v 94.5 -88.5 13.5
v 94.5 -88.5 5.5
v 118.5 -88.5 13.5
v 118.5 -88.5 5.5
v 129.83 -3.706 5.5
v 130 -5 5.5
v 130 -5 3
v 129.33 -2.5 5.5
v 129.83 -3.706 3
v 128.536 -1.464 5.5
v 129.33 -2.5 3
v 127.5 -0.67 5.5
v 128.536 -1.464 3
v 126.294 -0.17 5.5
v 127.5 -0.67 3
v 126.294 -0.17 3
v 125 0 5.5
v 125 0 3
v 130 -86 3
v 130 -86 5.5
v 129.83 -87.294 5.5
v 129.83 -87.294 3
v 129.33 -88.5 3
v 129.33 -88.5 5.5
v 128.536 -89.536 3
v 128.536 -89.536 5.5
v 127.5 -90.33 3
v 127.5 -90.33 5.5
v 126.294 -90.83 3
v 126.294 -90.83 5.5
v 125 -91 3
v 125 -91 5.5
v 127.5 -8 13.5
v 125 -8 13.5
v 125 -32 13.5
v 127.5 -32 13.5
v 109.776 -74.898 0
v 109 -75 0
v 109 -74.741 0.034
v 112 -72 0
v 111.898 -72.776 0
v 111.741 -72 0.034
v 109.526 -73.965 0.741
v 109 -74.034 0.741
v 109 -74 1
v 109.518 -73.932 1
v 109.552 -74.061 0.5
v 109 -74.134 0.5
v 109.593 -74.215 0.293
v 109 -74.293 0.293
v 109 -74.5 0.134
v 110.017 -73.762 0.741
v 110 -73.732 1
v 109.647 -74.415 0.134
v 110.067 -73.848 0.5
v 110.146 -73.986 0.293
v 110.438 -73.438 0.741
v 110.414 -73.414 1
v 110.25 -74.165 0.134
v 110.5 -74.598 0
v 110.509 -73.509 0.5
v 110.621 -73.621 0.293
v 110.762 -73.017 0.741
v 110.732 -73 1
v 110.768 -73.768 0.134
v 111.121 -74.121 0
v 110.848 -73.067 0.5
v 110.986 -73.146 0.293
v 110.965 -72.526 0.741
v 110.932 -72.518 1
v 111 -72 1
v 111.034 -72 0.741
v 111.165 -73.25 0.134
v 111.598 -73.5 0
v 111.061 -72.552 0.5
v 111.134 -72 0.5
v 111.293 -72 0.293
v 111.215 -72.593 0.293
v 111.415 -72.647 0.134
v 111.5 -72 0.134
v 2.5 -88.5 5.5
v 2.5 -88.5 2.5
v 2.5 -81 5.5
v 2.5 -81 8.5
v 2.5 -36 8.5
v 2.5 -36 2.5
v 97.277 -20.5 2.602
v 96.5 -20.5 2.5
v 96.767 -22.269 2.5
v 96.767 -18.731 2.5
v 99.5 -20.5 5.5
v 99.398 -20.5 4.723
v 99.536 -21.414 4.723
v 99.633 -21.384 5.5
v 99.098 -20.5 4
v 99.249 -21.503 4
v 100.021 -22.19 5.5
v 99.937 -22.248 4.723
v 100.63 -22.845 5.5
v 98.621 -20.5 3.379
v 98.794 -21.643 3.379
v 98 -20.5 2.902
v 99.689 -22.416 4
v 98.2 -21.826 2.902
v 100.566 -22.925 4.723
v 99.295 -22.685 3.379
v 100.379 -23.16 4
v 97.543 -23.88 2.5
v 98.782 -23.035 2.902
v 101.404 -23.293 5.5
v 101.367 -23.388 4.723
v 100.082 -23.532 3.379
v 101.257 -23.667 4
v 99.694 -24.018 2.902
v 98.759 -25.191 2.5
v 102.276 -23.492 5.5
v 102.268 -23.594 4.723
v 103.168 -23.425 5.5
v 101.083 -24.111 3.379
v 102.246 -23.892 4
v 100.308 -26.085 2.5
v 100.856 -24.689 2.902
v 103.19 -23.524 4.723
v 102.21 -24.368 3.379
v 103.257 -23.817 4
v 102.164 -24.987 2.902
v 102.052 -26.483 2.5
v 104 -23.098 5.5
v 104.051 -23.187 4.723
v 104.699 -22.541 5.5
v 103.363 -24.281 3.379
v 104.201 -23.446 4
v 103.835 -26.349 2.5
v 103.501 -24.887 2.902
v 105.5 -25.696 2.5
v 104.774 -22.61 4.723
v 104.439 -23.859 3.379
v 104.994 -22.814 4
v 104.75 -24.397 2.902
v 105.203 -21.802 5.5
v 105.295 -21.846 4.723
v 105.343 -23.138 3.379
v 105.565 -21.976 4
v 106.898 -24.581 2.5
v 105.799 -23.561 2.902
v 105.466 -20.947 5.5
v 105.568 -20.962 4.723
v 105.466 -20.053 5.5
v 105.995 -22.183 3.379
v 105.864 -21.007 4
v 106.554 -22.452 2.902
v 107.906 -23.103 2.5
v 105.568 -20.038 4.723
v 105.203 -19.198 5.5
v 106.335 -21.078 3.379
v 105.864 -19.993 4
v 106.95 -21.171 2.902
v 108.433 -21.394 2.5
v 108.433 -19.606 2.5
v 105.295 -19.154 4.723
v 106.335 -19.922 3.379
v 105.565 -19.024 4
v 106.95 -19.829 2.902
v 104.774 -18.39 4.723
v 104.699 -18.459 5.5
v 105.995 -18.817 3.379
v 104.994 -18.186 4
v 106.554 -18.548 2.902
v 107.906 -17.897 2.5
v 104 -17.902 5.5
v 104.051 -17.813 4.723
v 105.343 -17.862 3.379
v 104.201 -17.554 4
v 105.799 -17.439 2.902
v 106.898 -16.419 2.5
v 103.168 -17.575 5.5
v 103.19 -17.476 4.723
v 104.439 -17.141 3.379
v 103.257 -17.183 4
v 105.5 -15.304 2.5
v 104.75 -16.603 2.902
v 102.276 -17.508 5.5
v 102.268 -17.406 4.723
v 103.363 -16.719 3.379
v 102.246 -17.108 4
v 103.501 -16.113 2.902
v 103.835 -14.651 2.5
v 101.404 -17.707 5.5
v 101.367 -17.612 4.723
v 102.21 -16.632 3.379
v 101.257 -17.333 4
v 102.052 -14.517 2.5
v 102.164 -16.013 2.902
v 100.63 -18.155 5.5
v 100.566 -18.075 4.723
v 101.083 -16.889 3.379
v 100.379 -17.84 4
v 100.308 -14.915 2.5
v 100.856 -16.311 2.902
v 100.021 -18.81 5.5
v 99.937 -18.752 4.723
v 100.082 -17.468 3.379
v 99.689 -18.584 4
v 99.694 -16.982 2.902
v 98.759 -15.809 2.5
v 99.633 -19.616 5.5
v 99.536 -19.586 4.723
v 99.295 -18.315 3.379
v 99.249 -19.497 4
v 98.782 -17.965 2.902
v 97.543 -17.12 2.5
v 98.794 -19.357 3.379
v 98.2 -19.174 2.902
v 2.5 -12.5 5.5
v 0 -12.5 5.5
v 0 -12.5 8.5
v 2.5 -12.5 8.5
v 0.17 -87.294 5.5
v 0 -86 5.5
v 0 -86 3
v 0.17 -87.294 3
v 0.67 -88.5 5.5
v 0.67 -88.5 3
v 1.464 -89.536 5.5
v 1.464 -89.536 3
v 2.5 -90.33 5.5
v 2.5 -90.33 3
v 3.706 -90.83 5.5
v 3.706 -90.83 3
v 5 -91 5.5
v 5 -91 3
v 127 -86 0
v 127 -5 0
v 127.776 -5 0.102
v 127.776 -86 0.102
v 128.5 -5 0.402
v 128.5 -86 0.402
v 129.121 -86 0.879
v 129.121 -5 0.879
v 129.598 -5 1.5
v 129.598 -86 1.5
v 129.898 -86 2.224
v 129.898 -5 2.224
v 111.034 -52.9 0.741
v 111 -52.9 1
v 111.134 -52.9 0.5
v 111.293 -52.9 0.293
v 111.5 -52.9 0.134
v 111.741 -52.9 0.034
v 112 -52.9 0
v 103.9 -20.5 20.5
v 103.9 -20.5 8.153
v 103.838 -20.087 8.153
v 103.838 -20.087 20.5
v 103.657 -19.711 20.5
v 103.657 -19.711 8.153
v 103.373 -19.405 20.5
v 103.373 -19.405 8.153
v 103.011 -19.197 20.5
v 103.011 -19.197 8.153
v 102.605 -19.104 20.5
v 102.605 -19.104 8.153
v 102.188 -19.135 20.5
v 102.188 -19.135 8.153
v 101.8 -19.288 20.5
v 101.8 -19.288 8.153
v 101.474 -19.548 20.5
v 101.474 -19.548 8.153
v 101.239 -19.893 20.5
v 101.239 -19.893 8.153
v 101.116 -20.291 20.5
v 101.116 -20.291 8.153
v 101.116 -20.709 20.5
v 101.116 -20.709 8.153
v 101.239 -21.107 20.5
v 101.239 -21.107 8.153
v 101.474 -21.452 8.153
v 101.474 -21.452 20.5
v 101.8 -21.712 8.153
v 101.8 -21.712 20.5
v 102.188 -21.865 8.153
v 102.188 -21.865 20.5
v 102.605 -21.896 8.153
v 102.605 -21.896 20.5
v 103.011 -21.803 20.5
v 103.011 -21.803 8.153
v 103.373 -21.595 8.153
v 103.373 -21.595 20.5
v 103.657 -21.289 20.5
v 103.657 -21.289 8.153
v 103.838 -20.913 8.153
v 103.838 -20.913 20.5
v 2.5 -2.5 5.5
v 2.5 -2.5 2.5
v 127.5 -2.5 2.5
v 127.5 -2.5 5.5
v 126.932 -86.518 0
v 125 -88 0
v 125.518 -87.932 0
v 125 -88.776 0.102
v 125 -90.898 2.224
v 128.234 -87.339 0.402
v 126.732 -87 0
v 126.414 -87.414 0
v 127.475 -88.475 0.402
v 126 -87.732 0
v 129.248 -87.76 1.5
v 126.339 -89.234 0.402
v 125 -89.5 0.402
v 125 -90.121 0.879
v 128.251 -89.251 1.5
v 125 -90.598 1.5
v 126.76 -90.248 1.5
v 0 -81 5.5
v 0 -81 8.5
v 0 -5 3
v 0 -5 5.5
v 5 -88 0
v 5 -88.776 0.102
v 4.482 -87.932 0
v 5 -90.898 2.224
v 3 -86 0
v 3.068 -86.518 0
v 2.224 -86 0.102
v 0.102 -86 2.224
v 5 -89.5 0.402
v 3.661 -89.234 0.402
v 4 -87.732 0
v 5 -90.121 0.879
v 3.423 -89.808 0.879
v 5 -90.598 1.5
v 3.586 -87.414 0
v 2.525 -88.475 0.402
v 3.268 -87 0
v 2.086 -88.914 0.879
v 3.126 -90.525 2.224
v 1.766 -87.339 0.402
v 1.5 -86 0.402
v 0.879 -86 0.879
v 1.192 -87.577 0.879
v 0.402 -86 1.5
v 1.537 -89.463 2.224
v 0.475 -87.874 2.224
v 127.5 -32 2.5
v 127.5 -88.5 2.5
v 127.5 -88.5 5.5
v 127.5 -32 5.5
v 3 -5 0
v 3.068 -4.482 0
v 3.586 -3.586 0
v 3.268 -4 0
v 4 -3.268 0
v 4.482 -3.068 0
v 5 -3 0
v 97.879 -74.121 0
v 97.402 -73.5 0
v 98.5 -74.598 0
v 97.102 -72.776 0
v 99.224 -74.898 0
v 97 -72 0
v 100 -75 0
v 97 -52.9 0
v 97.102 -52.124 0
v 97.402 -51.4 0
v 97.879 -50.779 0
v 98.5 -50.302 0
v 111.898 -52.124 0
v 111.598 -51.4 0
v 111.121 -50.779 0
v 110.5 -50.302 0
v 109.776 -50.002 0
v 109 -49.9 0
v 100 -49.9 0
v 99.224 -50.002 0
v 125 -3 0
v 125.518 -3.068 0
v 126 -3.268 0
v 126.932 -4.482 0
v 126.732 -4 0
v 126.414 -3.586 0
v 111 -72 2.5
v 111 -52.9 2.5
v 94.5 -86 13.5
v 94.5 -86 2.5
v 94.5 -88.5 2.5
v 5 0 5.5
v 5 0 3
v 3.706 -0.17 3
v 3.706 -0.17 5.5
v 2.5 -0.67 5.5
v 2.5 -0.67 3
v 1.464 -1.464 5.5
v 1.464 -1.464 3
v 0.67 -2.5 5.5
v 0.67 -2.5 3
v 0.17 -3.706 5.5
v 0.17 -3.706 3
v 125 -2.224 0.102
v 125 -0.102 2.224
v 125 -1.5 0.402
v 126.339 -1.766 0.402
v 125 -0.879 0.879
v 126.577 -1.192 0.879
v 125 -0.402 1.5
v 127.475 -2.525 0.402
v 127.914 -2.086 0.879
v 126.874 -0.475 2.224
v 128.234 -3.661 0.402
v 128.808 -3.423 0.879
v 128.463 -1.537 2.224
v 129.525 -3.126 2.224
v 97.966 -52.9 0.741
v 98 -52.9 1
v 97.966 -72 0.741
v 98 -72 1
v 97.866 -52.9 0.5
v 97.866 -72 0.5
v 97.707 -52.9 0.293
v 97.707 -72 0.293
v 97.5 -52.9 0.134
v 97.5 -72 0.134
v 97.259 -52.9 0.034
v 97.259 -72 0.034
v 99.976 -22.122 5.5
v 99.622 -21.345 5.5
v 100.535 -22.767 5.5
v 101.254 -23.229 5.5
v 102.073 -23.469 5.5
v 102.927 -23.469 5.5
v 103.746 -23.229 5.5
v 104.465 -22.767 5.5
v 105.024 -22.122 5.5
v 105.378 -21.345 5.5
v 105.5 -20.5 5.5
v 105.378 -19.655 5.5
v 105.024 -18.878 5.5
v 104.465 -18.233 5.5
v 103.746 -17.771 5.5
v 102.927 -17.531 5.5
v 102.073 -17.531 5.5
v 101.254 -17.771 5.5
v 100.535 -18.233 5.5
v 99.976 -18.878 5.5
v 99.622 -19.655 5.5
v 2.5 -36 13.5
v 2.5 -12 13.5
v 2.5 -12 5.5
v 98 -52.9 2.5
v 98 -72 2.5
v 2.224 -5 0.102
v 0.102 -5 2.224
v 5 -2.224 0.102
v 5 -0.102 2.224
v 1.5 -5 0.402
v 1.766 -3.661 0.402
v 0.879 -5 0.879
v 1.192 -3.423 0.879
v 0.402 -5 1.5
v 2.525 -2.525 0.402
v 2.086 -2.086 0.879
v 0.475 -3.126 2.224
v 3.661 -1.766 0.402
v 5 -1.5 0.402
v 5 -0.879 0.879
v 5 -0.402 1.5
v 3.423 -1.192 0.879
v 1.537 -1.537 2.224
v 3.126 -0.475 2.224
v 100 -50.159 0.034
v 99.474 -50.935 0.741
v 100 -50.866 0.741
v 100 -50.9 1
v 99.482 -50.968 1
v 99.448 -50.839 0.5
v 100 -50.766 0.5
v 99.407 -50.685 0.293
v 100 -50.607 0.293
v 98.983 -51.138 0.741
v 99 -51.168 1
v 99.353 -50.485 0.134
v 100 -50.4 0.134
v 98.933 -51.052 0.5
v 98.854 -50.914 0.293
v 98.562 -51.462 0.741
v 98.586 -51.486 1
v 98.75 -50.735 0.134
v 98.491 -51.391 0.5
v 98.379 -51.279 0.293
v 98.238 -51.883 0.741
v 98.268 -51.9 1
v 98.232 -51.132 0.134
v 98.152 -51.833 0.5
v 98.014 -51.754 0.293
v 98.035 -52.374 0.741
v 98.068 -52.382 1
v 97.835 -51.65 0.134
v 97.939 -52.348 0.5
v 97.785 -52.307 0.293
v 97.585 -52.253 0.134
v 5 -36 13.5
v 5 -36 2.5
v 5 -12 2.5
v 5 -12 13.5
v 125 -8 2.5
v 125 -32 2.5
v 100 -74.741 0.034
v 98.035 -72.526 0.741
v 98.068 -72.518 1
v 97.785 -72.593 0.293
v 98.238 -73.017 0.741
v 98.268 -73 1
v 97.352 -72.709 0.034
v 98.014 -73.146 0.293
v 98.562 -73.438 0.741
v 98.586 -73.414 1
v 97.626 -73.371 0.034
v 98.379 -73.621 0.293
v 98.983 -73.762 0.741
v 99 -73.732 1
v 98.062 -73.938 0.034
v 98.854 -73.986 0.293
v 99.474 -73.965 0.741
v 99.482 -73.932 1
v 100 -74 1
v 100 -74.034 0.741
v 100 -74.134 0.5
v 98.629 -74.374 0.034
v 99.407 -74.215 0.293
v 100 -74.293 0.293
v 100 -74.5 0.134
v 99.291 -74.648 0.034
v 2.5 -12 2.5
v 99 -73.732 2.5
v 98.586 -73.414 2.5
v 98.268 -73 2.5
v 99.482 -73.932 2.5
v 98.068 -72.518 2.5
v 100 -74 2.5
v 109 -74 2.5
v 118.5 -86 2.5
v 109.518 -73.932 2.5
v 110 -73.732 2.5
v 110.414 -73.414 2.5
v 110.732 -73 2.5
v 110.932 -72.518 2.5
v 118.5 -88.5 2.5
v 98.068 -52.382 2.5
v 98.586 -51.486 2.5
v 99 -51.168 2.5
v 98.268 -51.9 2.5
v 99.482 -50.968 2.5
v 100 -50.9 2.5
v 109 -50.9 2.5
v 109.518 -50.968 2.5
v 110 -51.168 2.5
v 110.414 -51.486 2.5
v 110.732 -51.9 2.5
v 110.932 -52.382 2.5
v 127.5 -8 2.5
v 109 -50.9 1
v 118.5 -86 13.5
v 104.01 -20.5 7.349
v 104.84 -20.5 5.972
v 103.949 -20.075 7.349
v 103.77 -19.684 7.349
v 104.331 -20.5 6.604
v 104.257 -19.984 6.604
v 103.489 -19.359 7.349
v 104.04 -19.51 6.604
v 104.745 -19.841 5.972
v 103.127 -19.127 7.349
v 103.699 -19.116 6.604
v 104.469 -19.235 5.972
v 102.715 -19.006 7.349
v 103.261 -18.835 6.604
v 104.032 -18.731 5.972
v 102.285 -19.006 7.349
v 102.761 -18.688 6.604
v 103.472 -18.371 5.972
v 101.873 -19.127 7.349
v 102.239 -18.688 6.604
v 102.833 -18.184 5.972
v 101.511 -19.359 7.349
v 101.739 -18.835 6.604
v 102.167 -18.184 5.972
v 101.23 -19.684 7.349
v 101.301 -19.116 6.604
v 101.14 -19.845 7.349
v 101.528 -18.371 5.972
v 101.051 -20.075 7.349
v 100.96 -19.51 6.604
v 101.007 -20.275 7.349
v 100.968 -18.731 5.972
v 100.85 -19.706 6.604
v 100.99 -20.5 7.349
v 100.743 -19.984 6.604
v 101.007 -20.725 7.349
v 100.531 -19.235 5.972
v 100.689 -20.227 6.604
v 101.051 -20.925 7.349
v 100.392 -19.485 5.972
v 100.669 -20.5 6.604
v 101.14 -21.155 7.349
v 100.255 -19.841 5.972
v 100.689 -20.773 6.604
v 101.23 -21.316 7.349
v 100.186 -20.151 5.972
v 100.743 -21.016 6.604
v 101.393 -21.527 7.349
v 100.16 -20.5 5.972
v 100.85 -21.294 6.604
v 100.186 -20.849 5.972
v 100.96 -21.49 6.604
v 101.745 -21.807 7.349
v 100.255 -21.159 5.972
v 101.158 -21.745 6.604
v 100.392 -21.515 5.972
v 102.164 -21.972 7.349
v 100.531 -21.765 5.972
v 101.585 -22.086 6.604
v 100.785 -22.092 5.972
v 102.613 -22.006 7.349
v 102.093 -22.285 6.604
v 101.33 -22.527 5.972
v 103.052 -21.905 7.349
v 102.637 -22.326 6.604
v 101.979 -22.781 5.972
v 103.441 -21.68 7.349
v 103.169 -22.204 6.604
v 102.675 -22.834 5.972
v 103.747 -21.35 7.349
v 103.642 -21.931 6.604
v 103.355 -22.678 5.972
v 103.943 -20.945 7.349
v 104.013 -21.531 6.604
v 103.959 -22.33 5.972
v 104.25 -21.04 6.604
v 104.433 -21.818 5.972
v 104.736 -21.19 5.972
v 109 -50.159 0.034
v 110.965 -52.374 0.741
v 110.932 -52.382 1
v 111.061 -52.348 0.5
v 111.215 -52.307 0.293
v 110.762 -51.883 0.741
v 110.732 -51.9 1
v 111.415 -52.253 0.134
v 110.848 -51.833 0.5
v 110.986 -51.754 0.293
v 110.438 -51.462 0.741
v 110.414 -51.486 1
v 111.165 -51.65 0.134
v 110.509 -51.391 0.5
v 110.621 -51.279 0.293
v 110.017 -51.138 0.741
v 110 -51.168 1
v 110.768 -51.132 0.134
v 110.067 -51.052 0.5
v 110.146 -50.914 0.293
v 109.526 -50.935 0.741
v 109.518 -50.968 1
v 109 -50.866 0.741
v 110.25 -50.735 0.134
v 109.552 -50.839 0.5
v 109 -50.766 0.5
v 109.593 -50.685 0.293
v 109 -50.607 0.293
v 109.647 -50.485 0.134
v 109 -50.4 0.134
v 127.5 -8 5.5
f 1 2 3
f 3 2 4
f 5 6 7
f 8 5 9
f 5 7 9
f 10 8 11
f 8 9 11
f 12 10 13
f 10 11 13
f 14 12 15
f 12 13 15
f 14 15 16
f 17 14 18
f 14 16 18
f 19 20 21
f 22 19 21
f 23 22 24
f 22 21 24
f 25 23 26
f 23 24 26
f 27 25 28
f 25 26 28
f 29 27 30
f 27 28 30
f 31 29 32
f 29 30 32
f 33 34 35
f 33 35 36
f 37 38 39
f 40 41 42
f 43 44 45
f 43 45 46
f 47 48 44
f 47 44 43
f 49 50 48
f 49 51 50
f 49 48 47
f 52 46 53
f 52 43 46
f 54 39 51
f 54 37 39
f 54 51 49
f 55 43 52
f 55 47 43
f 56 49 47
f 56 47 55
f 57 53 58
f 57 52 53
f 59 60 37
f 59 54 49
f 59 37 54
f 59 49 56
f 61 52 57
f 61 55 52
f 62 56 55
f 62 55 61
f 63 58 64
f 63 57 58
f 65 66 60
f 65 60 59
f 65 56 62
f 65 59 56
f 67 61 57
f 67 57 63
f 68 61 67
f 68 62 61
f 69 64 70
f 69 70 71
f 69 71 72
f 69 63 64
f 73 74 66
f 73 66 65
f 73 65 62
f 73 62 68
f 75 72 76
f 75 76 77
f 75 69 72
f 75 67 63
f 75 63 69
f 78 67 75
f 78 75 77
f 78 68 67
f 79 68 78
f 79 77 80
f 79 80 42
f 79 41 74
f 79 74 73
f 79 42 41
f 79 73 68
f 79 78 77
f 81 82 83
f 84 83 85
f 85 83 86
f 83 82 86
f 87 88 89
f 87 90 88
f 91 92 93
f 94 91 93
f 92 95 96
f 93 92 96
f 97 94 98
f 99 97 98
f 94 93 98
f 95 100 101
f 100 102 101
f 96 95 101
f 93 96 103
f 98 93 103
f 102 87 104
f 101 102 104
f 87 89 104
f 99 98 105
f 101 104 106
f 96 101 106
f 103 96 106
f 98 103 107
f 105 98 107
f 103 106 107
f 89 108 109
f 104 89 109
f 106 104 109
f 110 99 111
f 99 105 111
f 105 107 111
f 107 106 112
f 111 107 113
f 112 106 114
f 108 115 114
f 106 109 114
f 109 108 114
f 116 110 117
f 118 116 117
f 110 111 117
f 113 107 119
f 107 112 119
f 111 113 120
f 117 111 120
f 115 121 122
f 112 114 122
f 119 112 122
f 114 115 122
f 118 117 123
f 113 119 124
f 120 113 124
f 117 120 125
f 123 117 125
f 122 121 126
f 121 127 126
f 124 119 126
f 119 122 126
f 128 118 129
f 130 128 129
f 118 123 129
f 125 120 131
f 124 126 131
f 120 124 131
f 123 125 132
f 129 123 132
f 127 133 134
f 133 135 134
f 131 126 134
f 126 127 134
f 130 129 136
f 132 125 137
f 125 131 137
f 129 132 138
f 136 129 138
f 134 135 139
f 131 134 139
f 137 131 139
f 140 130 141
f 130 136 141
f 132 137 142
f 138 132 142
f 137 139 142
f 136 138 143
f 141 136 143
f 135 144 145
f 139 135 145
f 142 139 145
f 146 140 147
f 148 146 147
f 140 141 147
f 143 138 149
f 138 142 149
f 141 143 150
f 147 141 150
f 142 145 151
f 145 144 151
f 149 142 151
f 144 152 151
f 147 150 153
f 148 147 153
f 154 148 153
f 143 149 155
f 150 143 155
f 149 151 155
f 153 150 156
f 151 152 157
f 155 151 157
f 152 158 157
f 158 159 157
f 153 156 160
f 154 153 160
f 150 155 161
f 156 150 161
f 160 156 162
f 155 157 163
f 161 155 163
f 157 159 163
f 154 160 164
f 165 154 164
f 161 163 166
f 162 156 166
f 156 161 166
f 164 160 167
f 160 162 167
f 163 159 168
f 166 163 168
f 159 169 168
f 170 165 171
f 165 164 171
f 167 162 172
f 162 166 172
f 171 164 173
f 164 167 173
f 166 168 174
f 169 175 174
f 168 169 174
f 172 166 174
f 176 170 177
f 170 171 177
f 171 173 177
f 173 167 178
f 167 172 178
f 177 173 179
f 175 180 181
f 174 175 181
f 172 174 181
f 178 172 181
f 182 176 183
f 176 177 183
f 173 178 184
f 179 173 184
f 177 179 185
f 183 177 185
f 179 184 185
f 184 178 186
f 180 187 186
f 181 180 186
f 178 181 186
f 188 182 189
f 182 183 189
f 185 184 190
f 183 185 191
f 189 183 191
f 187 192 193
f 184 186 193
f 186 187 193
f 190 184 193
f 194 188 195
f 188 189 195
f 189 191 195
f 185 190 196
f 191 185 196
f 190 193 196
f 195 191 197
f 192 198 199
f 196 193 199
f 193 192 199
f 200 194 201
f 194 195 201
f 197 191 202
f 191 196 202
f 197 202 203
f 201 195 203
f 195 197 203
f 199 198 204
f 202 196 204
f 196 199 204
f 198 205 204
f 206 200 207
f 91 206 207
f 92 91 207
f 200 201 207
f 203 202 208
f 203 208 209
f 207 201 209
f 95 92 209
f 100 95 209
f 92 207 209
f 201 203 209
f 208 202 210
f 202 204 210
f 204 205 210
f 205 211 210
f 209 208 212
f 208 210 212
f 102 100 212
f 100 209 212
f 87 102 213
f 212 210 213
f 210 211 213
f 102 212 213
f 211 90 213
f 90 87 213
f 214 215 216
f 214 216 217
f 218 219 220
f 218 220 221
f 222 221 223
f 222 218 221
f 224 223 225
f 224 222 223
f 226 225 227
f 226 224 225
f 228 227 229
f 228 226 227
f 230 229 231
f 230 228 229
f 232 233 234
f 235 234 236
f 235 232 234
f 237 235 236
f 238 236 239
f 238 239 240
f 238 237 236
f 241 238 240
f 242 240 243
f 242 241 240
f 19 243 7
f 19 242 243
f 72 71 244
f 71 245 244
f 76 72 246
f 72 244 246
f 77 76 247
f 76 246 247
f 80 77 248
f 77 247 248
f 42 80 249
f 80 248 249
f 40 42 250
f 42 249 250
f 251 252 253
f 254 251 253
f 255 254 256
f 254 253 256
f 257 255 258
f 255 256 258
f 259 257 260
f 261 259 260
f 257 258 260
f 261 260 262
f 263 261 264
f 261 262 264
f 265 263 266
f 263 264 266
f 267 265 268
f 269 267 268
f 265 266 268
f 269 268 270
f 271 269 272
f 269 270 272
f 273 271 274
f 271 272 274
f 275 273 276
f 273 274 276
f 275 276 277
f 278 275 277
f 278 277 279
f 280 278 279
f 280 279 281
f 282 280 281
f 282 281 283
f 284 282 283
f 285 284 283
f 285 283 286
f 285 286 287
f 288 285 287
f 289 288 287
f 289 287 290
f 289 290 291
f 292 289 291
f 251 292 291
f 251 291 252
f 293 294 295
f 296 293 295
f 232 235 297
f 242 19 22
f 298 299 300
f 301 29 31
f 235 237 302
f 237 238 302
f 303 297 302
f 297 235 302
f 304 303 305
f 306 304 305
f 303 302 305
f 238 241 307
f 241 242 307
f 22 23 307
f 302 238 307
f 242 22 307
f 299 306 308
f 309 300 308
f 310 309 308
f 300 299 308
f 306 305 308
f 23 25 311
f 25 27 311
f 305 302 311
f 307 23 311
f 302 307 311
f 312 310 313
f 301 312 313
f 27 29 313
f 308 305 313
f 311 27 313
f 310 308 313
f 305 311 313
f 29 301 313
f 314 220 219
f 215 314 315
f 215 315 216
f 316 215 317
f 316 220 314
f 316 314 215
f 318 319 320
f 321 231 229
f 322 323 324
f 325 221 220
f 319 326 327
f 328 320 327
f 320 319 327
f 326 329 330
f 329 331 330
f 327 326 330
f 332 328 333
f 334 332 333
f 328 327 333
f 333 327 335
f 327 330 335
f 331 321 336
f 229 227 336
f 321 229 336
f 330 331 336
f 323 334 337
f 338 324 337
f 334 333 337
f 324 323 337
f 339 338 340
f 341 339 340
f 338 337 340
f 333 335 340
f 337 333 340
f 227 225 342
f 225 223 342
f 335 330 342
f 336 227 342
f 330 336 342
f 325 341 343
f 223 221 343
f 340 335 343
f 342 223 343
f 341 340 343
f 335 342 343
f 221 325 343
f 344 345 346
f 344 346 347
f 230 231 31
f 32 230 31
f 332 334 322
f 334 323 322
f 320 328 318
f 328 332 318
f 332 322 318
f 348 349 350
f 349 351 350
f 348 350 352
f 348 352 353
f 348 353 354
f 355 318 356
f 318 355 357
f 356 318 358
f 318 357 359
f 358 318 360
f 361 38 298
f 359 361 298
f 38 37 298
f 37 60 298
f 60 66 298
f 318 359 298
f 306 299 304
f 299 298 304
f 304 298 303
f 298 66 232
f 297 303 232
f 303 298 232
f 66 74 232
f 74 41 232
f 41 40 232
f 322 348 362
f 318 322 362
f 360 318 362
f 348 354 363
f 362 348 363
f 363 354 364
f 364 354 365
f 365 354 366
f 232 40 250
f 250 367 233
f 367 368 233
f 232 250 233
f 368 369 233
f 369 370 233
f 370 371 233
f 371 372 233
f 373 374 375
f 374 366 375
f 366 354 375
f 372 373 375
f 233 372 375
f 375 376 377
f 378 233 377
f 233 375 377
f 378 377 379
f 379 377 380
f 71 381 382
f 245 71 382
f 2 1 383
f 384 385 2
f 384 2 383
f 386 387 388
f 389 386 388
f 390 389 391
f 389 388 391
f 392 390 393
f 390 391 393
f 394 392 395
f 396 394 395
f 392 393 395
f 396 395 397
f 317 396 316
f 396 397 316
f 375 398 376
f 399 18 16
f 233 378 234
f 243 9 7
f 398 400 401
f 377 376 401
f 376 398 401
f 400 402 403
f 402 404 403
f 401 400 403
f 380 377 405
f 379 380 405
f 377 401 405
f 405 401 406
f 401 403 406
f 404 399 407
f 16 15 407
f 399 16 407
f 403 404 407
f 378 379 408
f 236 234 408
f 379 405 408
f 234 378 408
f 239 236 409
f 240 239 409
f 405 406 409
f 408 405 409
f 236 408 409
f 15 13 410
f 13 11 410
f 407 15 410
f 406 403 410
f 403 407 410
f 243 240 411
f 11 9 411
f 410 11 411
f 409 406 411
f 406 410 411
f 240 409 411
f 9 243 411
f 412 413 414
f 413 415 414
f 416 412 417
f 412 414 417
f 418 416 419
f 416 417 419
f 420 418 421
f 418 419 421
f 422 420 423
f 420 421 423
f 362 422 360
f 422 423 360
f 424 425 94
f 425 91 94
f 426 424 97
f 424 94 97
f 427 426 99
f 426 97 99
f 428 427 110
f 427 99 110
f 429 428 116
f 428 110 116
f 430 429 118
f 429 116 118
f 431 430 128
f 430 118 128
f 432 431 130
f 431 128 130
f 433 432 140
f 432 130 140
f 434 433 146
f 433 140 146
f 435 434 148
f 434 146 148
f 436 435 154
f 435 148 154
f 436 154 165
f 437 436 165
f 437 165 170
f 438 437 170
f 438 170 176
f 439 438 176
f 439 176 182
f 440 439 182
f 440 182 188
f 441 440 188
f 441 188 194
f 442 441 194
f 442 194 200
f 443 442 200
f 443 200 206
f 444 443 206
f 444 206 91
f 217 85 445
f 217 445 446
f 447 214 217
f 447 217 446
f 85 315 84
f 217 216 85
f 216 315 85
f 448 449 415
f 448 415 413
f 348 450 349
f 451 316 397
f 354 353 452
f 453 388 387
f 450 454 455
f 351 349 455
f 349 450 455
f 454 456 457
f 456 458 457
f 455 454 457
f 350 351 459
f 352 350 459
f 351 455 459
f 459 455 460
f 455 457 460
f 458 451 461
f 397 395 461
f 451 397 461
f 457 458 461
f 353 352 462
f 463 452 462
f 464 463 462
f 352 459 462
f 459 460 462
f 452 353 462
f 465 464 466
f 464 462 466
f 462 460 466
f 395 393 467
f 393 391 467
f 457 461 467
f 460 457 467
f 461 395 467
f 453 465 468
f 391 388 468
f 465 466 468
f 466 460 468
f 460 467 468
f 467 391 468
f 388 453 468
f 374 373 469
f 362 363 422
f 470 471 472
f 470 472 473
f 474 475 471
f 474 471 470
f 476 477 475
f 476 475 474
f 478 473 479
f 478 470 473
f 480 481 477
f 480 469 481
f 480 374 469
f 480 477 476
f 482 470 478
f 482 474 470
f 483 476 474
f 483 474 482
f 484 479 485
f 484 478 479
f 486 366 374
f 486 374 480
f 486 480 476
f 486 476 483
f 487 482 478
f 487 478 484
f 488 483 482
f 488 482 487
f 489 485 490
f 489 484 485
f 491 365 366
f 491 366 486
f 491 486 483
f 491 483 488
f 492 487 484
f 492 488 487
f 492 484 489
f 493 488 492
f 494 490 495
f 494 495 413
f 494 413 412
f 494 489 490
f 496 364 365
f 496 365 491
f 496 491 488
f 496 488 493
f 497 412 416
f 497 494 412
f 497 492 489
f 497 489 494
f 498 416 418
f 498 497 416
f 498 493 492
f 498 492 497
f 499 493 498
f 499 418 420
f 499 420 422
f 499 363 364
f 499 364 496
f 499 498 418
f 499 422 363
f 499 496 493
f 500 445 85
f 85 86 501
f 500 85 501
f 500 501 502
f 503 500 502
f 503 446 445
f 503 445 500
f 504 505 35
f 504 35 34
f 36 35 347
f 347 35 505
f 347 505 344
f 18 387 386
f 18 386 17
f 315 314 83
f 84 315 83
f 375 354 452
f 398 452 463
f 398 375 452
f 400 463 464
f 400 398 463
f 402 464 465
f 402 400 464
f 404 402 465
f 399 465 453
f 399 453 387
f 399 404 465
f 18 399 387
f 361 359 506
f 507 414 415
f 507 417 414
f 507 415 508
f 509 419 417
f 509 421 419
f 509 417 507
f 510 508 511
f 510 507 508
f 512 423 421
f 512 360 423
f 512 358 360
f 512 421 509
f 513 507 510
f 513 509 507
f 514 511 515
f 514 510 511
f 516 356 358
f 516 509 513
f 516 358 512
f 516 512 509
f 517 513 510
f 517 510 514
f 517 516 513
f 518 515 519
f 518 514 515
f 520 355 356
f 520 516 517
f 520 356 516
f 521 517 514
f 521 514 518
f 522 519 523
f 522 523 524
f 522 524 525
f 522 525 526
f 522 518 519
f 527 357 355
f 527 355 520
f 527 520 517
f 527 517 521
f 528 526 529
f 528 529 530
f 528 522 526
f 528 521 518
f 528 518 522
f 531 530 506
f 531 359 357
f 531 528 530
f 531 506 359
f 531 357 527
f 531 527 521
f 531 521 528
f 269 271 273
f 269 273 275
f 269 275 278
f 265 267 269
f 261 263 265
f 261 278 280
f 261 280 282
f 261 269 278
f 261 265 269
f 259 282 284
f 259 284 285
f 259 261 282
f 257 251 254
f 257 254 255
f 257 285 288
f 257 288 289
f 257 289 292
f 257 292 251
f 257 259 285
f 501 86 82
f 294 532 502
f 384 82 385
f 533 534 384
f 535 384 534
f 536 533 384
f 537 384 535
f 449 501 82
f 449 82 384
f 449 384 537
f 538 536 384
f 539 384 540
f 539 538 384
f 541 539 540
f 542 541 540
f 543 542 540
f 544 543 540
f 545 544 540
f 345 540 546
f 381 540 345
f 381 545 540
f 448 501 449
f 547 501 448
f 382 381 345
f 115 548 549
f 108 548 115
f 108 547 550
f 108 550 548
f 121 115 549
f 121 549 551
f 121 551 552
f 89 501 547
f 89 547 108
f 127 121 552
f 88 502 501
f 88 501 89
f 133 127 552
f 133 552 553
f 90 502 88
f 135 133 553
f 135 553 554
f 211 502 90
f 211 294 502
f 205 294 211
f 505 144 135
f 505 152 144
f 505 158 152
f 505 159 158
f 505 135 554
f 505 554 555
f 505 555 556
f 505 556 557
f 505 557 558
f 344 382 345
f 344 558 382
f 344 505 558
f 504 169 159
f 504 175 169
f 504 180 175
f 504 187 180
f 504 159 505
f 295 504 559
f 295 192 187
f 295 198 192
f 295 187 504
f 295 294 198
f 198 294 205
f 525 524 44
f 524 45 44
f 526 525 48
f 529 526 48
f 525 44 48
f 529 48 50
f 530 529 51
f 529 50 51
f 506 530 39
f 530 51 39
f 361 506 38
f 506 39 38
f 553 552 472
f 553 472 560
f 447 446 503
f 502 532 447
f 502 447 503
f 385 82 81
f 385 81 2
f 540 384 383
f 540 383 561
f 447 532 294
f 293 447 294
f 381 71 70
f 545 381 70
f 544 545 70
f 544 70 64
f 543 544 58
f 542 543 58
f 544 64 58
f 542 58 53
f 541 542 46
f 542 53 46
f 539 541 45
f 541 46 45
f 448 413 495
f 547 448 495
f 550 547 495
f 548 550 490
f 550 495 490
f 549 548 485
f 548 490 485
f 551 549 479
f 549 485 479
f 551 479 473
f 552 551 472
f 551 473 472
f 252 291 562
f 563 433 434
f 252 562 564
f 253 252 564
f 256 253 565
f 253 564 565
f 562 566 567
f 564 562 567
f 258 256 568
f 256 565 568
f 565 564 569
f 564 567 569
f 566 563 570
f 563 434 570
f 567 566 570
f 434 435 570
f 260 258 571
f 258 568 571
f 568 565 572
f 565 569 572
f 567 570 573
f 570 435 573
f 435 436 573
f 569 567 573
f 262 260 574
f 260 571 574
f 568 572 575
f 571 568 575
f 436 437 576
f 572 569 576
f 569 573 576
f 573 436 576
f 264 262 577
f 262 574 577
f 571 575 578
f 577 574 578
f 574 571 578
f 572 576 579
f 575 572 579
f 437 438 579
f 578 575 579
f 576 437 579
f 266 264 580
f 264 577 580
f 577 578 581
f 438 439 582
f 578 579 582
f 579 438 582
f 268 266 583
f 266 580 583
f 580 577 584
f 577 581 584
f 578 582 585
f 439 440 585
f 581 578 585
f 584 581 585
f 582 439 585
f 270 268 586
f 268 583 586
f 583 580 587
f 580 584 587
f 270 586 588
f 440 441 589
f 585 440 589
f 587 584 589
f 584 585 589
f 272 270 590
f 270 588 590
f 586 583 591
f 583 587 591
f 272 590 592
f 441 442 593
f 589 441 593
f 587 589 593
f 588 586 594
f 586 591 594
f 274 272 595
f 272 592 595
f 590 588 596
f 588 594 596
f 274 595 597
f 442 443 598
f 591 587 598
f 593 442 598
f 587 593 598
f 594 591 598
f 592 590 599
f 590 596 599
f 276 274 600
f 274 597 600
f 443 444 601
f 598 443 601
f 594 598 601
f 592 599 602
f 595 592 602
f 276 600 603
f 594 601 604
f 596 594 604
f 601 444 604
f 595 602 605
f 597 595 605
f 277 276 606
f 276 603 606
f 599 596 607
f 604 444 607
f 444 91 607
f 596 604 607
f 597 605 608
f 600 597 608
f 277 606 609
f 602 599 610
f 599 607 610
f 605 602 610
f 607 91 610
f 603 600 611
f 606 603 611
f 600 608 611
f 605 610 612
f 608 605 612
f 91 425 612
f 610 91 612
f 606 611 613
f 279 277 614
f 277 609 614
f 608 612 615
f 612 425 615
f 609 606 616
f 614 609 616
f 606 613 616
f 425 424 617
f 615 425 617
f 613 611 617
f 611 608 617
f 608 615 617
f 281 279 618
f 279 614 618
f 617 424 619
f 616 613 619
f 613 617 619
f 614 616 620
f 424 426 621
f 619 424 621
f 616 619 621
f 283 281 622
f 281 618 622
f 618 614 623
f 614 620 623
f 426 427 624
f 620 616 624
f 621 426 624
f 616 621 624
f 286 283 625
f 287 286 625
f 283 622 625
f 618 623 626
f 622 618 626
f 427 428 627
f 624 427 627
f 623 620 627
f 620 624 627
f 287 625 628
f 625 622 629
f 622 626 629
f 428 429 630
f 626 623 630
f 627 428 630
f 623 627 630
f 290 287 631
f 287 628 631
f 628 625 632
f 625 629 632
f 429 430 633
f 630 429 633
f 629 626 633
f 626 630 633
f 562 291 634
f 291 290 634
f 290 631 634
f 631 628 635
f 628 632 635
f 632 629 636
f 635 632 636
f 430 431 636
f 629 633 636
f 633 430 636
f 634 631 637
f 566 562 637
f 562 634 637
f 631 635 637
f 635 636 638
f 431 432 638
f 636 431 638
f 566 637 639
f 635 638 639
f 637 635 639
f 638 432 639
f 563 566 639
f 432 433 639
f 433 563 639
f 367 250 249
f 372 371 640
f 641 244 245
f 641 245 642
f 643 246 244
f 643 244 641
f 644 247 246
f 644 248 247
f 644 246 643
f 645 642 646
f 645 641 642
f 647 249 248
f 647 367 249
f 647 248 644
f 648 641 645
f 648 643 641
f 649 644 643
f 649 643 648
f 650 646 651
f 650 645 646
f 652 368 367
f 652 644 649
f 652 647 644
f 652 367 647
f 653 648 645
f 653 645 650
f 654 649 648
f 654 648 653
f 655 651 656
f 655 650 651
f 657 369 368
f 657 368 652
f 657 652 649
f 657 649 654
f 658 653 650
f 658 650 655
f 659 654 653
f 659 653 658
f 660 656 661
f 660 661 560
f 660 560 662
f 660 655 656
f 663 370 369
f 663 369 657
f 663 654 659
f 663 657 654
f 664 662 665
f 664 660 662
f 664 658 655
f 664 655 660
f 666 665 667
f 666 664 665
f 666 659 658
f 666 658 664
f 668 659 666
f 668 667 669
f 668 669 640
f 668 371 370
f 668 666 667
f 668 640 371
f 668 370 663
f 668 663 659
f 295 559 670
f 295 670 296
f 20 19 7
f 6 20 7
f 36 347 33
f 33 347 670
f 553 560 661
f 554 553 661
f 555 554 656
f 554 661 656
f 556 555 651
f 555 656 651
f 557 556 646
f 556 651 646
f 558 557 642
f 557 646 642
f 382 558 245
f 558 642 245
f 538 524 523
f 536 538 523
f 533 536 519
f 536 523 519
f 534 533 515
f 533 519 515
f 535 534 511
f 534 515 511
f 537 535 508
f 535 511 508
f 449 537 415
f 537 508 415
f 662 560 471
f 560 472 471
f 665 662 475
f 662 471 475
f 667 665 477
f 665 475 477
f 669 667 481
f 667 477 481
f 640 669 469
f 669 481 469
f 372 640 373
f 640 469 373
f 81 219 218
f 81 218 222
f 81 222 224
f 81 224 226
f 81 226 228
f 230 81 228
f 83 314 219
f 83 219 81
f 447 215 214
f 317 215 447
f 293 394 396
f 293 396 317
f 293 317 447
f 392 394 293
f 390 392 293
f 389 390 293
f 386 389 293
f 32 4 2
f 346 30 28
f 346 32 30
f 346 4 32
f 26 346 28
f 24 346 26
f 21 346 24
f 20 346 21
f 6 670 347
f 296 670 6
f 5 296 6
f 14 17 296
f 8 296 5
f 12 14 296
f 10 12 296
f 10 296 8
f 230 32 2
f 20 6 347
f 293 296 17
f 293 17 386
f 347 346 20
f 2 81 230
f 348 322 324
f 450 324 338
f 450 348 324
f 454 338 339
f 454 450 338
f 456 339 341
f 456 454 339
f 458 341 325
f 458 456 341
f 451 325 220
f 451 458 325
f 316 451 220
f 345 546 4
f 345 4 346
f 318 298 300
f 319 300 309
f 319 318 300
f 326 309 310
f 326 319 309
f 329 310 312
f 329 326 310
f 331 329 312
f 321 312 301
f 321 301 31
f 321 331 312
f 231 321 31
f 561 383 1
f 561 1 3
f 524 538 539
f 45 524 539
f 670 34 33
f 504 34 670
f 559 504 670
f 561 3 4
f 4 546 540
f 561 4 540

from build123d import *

# Parameters (mm, degrees)
SKETCH1_W            = 130
SKETCH1_H            = 91
BOSS_EXTRUDE1_DEPTH  = 2.5
SKETCH3_W            = 130
SKETCH3_H            = 2.5
BOSS_EXTRUDE2_DEPTH  = 3
SKETCH2_W            = 130
SKETCH2_H            = 2.5
BOSS_EXTRUDE3_DEPTH  = 3
SKETCH4_W            = 2.5
SKETCH4_H            = 86
BOSS_EXTRUDE4_DEPTH  = 3
SKETCH5_W            = 2.5
SKETCH5_H            = 86
BOSS_EXTRUDE5_DEPTH  = 3
FILLET2_R            = 5
FILLET3_R            = 5
FILLET4_R            = 5
FILLET5_R            = 5
SKETCH7_W            = 2.5
SKETCH7_H            = 68.5
BOSS_EXTRUDE6_DEPTH  = 3
SKETCH8_W            = 24
SKETCH8_H            = 2.5
BOSS_EXTRUDE7_DEPTH  = 11
SKETCH9_W            = 2.5
SKETCH9_H            = 24
BOSS_EXTRUDE8_DEPTH  = 11
SKETCH10_W           = 2.5
SKETCH10_H           = 24
BOSS_EXTRUDE9_DEPTH  = 11
SKETCH11_R           = 3
BOSS_EXTRUDE10_DEPTH = 3
SKETCH12_R           = 1.4
BOSS_EXTRUDE11_DEPTH = 15
SKETCH13_W           = 13
SKETCH13_H           = 23.1
CUT_EXTRUDE1_DEPTH   = 160.702849067
FILLET17_R           = 2
FILLET18_R           = 2
FILLET19_R           = 2
FILLET20_R           = 2
FILLET23_R           = 1
FILLET24_R           = 3
FILLET25_R           = 3
FILLET26_R           = 3


# Some blends are built 0.0001 mm under size
with BuildPart() as part:
    # Sketch1 → Boss-Extrude1 (new body)
    with BuildSketch(Plane.XY):
        with Locations((65, -45.5)):
            Rectangle(SKETCH1_W, SKETCH1_H)
    extrude(amount=BOSS_EXTRUDE1_DEPTH)

    # Sketch3 → Boss-Extrude2 (add)
    with BuildSketch(Plane.XY.offset(2.5)):
        with Locations((65, -89.75)):
            Rectangle(SKETCH3_W, SKETCH3_H)
    extrude(amount=BOSS_EXTRUDE2_DEPTH)

    # Sketch2 → Boss-Extrude3 (add)
    with BuildSketch(Plane.XY.offset(2.5)):
        with Locations((65, -1.25)):
            Rectangle(SKETCH2_W, SKETCH2_H)
    extrude(amount=BOSS_EXTRUDE3_DEPTH)

    # Sketch4 → Boss-Extrude4 (add)
    with BuildSketch(Plane.XY.offset(2.5)):
        with Locations((128.75, -45.5)):
            Rectangle(SKETCH4_W, SKETCH4_H)
    extrude(amount=BOSS_EXTRUDE4_DEPTH)

    # Sketch5 → Boss-Extrude5 (add)
    with BuildSketch(Plane.XY.offset(2.5)):
        with Locations((1.25, -45.5)):
            Rectangle(SKETCH5_W, SKETCH5_H)
    extrude(amount=BOSS_EXTRUDE5_DEPTH)

    # Fillet2
    fillet2_edges = [part.edges().sort_by_distance(p)[0] for p in [
        (130, -91, 2.75),
    ]]
    fillet(fillet2_edges, radius=FILLET2_R)

    # Fillet3
    fillet3_edges = [part.edges().sort_by_distance(p)[0] for p in [
        (130, 0, 2.75),
    ]]
    fillet(fillet3_edges, radius=FILLET3_R)

    # Fillet4
    fillet4_edges = [part.edges().sort_by_distance(p)[0] for p in [
        (0, 0, 2.75),
    ]]
    fillet(fillet4_edges, radius=FILLET4_R)

    # Fillet5
    fillet5_edges = [part.edges().sort_by_distance(p)[0] for p in [
        (0, -91, 2.75),
    ]]
    fillet(fillet5_edges, radius=FILLET5_R)

    # Sketch7 → Boss-Extrude6 (add)
    with BuildSketch(Plane.XY.offset(5.5)):
        with Locations((1.25, -46.75)):
            Rectangle(SKETCH7_W, SKETCH7_H)
    extrude(amount=BOSS_EXTRUDE6_DEPTH)

    # Sketch8 → Boss-Extrude7 (add)
    with BuildSketch(Plane.XY.offset(2.5)):
        with Locations((106.5, -87.25)):
            Rectangle(SKETCH8_W, SKETCH8_H)
    extrude(amount=BOSS_EXTRUDE7_DEPTH)

    # Sketch9 → Boss-Extrude8 (add)
    with BuildSketch(Plane.XY.offset(2.5)):
        with Locations((126.25, -20)):
            Rectangle(SKETCH9_W, SKETCH9_H)
    extrude(amount=BOSS_EXTRUDE8_DEPTH)

    # Sketch10 → Boss-Extrude9 (add)
    with BuildSketch(Plane.XY.offset(2.5)):
        with Locations((3.75, -24)):
            Rectangle(SKETCH10_W, SKETCH10_H)
    extrude(amount=BOSS_EXTRUDE9_DEPTH)

    # Sketch11 → Boss-Extrude10 (add)
    with BuildSketch(Plane.XY.offset(2.5)):
        with Locations(Location((102.5, -20.5, 0), (0, 0, 180))):
            Circle(SKETCH11_R)
    extrude(amount=BOSS_EXTRUDE10_DEPTH)

    # Sketch12 → Boss-Extrude11 (add)
    with BuildSketch(Plane.XY.offset(5.5)):
        with Locations((102.5, -20.5)):
            Circle(SKETCH12_R)
    extrude(amount=BOSS_EXTRUDE11_DEPTH)

    # Sketch13 → Cut-Extrude1 (cut, through all)
    with BuildSketch(Plane.XY.offset(2.5)):
        with Locations((104.5, -62.45)):
            Rectangle(SKETCH13_W, SKETCH13_H)
    extrude(amount=-CUT_EXTRUDE1_DEPTH, mode=Mode.SUBTRACT)

    # Fillet17
    fillet17_edges = [part.edges().sort_by_distance(p)[0] for p in [
        (98, -74, 1.25),
    ]]
    fillet(fillet17_edges, radius=FILLET17_R)

    # Fillet18
    fillet18_edges = [part.edges().sort_by_distance(p)[0] for p in [
        (98, -50.9, 1.25),
    ]]
    fillet(fillet18_edges, radius=FILLET18_R)

    # Fillet19
    fillet19_edges = [part.edges().sort_by_distance(p)[0] for p in [
        (111, -50.9, 1.25),
    ]]
    fillet(fillet19_edges, radius=FILLET19_R)

    # Fillet20
    fillet20_edges = [part.edges().sort_by_distance(p)[0] for p in [
        (111, -74, 1.25),
    ]]
    fillet(fillet20_edges, radius=FILLET20_R)

    # Fillet23
    fillet23_edges = [part.edges().sort_by_distance(p)[0] for p in [
        (104.5, -74, 0),
        (98.585786438, -73.414213562, 0),
        (98, -62.45, 0),
        (98.585786438, -51.485786438, 0),
        (104.5, -50.9, 0),
        (110.414213562, -51.485786438, 0),
        (111, -62.45, 0),
        (110.414213562, -73.414213562, 0),
    ]]
    fillet(fillet23_edges, radius=FILLET23_R)

    # Fillet24
    fillet24_edges = [part.edges().sort_by_distance(p)[0] for p in [
        (128.535533906, -89.535533906, 0),
        (130, -45.5, 0),
        (128.535533906, -1.464466094, 0),
        (0, -45.5, 0),
        (65, 0, 0),
        (1.464466094, -1.464466094, 0),
        (65, -91, 0),
        (1.464466094, -89.535533906, 0),
    ]]
    fillet(fillet24_edges, radius=FILLET24_R)

    # Fillet25
    # the kernel refuses this fillet: 3 mm, written as the material it adds along each edge
    with BuildSketch(Plane(origin=(102.5, -20.5, 5.5), x_dir=(1, 0, 0), z_dir=(0, -1, 0))) as fillet25_piece_1:
        with BuildLine():
            CenterArc((4.4, 2.653299832), FILLET25_R, 180, 62.181860715)
            Line((1.4, 2.653299832), (1.34, 2.653299832))
            Line((1.34, 2.653299832), (1.34, 0))
            Line((1.34, 0), (1.4, -0.06))
            ThreePointArc((1.4, -0.06), (2.2, -0.06), (2.972, -0.053065997))
            Line((2.972, -0.053065997), (3, 0))
        make_face()
    revolve(axis=Axis((102.5, -20.5, 5.5), (0, 0, 1)))

    # Fillet26
    fillet26_edges = [part.edges().sort_by_distance(p)[0] for p in [
        (105.5, -20.5, 2.5),
    ]]
    fillet(fillet26_edges, radius=FILLET26_R - 0.0001)  # a hair under: the kernel refuses the full size


solid = part.part
